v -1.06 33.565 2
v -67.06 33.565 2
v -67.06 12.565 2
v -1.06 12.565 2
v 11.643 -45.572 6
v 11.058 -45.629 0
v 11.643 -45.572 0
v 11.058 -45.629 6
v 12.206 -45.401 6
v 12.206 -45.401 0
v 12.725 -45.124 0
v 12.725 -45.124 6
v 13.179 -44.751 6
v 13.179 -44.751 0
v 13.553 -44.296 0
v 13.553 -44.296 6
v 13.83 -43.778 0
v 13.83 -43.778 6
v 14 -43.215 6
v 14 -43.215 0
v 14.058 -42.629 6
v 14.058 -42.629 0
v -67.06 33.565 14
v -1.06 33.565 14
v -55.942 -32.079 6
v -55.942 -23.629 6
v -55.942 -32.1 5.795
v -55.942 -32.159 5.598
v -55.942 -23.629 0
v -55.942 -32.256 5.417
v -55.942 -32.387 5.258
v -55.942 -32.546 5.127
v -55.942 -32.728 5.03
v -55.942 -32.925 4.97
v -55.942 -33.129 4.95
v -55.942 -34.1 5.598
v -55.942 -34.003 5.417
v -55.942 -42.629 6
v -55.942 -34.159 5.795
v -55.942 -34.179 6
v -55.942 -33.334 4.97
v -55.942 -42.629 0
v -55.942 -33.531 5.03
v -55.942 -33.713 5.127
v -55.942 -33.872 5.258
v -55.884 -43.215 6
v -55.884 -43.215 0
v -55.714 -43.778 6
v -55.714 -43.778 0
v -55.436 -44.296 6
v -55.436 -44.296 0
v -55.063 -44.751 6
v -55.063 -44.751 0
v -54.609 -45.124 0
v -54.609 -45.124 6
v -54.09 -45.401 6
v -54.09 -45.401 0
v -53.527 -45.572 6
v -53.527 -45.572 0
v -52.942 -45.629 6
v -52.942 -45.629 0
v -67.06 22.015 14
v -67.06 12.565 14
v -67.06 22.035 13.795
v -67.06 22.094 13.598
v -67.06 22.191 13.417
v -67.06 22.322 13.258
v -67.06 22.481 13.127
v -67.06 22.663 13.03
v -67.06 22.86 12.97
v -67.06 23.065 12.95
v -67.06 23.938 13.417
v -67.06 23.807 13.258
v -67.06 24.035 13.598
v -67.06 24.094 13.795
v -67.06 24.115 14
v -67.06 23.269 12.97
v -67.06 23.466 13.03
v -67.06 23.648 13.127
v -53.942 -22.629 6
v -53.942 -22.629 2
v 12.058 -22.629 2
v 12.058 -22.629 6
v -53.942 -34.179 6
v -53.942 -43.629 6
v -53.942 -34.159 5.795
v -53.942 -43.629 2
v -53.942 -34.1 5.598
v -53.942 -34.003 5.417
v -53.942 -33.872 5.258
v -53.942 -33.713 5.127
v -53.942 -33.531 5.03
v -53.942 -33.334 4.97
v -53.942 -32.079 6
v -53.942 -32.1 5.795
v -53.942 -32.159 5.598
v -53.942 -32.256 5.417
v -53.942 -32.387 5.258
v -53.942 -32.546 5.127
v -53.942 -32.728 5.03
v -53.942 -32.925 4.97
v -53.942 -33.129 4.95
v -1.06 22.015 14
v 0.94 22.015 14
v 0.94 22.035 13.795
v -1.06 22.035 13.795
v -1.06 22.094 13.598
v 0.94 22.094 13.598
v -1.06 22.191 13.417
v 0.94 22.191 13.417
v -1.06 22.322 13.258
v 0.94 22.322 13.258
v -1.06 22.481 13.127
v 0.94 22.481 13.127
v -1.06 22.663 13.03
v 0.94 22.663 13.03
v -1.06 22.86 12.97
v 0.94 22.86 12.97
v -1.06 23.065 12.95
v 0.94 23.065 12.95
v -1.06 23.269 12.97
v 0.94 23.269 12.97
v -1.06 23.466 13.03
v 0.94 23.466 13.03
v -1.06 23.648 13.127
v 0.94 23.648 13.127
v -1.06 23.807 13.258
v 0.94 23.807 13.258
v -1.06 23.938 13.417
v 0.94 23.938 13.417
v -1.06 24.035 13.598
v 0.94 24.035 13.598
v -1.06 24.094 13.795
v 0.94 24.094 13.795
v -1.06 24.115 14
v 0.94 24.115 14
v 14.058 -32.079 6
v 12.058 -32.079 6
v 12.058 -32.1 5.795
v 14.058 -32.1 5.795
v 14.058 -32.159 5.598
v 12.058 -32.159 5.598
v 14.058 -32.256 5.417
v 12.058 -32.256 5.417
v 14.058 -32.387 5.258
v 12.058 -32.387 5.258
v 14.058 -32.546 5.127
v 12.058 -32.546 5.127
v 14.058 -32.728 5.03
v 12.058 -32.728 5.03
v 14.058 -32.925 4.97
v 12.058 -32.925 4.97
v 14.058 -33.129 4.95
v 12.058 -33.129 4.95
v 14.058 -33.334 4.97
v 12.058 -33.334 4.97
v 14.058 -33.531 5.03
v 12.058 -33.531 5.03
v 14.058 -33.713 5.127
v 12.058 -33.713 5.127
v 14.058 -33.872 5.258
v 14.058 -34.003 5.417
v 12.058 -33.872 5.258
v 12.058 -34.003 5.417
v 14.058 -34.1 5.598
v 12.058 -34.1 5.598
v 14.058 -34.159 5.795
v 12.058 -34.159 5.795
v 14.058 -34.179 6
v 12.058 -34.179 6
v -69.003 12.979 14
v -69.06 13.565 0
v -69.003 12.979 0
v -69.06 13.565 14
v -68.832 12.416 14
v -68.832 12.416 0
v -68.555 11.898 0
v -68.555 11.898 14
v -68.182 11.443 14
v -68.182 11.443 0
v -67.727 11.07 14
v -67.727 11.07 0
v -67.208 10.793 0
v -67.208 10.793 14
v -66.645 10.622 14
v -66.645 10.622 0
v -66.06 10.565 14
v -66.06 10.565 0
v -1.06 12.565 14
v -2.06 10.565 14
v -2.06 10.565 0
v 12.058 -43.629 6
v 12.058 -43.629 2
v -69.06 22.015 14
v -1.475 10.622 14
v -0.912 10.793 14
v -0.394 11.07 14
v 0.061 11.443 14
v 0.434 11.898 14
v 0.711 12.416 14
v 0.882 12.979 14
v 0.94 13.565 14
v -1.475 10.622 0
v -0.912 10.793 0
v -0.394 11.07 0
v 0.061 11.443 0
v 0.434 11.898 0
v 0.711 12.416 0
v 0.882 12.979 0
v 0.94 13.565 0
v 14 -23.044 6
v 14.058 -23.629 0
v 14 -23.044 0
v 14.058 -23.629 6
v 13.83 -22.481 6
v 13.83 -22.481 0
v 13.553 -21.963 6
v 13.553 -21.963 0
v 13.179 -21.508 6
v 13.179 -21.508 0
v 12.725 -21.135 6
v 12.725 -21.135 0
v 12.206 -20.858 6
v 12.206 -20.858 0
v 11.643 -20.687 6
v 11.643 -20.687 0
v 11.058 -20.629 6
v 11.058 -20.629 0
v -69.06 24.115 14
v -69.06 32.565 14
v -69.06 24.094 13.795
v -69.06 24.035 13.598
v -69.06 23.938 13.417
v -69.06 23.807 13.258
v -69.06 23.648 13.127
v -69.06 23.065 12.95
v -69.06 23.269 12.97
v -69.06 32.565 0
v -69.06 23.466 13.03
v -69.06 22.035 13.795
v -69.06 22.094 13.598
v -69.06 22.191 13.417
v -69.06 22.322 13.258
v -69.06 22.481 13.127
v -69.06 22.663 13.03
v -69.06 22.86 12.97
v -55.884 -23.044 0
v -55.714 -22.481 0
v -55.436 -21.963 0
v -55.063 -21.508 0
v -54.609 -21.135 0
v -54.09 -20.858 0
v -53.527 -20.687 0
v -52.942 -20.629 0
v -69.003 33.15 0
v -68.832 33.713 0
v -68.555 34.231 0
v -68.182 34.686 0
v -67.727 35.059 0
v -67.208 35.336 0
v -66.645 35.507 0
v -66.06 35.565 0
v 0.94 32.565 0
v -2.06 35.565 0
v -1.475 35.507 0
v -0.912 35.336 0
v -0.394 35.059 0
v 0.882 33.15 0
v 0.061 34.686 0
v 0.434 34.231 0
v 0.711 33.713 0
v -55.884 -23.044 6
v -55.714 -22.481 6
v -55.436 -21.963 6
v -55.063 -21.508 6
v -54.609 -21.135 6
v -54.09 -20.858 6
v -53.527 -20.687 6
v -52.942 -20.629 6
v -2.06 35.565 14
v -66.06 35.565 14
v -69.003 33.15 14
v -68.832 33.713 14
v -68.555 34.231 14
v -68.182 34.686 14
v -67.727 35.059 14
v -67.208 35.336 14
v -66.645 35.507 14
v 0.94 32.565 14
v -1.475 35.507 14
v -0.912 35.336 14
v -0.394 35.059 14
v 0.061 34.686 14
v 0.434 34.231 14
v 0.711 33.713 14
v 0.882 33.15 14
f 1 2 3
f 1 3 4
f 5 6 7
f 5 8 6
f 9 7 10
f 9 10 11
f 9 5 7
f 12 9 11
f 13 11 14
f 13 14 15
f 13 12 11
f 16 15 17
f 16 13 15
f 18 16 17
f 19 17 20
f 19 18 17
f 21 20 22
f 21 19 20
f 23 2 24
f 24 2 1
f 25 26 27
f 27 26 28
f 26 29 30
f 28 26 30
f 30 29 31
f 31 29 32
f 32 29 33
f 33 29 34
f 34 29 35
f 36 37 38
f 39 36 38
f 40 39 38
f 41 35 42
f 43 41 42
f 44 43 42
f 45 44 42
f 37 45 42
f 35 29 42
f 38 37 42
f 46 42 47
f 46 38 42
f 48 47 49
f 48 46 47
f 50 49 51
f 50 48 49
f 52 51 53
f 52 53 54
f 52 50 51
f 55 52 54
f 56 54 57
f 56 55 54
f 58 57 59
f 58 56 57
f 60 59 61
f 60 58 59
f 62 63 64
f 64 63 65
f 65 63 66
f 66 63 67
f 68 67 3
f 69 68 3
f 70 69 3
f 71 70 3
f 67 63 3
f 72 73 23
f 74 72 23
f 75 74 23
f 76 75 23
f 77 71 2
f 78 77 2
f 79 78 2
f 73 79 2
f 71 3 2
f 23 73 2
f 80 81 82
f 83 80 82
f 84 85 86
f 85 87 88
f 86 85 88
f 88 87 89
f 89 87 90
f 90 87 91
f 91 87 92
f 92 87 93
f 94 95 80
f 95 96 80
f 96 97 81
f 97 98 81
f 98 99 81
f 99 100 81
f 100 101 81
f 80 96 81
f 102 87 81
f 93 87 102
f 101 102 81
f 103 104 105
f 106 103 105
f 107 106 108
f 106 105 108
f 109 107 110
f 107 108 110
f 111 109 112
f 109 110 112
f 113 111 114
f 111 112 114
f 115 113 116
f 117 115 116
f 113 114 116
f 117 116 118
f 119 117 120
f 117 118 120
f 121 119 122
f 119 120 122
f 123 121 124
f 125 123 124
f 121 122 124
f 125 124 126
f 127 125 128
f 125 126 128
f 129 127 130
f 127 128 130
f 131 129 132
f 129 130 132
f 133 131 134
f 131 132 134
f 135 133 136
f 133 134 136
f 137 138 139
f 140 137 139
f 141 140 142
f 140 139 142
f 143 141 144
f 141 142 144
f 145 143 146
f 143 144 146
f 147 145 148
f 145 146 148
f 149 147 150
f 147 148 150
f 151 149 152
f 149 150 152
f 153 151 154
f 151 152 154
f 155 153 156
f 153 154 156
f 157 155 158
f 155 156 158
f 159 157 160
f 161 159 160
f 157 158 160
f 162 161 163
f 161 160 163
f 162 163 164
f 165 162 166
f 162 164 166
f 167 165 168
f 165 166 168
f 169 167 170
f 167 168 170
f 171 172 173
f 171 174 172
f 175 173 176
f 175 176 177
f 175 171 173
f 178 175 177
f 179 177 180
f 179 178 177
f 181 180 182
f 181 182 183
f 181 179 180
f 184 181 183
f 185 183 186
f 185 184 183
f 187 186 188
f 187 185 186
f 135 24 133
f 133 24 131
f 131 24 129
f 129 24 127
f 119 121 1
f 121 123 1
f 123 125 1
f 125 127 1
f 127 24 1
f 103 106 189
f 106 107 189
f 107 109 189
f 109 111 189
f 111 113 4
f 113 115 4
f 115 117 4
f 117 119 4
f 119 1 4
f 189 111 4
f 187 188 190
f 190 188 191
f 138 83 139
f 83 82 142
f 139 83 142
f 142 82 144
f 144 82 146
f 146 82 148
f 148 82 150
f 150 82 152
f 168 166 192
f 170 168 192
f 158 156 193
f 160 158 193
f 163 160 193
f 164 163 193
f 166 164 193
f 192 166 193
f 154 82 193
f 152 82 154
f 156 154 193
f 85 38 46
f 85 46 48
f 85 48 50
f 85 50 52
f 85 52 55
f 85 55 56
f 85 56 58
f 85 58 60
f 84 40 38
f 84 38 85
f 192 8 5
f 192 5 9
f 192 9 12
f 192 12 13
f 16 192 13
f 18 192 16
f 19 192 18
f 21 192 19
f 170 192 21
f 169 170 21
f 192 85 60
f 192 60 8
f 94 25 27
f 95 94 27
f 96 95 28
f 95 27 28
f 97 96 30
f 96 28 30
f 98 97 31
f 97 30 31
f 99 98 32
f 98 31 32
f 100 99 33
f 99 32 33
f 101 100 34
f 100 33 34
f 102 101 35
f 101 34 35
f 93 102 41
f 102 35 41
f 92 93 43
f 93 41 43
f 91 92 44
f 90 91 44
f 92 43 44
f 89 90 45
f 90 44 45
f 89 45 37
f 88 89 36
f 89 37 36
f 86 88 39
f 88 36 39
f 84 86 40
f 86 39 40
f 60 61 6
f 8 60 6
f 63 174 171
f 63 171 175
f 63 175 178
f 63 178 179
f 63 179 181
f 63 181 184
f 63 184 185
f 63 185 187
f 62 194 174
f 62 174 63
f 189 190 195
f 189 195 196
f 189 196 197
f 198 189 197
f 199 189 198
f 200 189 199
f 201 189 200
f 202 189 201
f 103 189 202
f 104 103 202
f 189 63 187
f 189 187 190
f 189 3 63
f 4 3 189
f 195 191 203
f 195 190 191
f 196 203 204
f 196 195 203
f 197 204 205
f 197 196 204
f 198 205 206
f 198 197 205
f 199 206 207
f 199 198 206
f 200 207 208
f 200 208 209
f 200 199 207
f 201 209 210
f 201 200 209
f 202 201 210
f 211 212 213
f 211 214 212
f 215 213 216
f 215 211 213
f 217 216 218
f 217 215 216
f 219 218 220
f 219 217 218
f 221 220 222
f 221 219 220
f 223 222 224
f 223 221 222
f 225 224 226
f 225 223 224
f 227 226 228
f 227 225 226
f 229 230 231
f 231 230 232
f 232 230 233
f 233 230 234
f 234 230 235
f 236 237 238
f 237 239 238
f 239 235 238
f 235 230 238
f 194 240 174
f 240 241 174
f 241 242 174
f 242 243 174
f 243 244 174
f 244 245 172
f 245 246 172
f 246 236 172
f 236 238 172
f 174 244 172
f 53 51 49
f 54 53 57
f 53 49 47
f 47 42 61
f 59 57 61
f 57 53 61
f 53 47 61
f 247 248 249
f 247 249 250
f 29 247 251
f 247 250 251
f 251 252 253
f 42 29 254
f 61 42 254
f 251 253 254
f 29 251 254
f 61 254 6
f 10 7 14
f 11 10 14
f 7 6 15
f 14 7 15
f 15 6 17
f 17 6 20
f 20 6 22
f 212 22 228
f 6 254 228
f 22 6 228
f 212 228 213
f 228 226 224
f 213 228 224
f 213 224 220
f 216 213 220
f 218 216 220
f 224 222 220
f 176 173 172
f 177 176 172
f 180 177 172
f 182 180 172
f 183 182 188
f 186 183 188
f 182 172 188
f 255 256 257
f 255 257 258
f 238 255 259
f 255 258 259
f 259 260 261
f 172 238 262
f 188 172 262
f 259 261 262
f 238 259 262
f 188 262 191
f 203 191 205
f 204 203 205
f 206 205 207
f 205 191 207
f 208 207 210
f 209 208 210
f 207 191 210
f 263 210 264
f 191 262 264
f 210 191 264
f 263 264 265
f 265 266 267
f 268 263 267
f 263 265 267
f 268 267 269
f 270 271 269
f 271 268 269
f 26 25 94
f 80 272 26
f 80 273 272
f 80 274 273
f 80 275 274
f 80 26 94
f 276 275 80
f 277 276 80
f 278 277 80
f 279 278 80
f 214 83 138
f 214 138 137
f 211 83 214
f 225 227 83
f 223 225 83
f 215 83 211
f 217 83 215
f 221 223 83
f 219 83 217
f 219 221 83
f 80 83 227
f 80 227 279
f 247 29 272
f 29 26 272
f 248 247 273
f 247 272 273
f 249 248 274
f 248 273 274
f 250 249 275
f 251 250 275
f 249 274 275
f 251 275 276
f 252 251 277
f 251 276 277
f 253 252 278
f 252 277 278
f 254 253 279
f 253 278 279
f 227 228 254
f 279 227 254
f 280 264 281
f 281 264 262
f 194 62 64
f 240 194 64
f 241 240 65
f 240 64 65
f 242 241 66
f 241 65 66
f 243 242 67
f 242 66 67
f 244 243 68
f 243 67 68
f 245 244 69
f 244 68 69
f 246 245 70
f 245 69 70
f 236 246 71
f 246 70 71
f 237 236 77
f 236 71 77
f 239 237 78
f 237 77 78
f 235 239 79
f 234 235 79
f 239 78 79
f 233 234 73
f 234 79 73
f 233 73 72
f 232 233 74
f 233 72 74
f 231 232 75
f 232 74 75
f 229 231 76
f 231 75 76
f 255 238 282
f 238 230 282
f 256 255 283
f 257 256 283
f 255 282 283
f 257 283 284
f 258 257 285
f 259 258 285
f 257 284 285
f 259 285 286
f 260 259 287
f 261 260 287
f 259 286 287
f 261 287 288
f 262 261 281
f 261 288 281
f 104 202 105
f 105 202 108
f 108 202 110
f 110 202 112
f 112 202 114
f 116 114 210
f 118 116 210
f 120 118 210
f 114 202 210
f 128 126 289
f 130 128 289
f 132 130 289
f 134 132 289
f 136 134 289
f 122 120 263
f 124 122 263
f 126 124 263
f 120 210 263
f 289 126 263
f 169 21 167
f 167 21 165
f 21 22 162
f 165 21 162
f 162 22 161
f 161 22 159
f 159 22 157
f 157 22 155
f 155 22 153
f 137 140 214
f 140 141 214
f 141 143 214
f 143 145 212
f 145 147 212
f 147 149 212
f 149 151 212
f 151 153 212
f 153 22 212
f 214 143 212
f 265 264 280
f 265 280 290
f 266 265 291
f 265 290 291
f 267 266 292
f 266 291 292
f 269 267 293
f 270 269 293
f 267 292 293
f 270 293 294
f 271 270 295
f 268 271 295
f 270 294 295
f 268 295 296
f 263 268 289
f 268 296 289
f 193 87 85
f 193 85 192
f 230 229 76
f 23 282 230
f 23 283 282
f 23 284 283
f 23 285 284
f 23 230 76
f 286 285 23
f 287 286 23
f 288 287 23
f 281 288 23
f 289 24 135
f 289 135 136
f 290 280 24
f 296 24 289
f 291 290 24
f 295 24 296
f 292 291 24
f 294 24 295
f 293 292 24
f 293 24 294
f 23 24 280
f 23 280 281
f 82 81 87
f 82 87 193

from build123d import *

# Parameters (mm, degrees)
F0_W      = 66
F0_H      = 21
F1_DEPTH  = 2
F0_H_2    = 2
F2_DEPTH  = 14
F4_DEPTH  = 80
F5_R      = 3
F6_DEPTH  = 2
F7_DEPTH  = 6
F8_R      = 3
F10_DEPTH = 80


with BuildPart() as f1:
    # F0 (on Top) → F1 (new body)
    with BuildSketch(Plane.XY):
        with Locations((-34.0602138638, 23.0645144358)):
            Rectangle(F0_W, F0_H)
    extrude(amount=F1_DEPTH)

    # F0 (on Top) → F2 (join)
    with BuildSketch(Plane.XY):
        Polygon((-67.0602138638, 12.5645144358), (-67.0602138638, 33.5645144358), (-67.0602138638, 35.5645144358), (-69.0602138638, 35.5645144358), (-69.0602138638, 10.5645144358), (-67.0602138638, 10.5645144358), align=None)
        with Locations((-34.0602138638, 11.5645144358)):
            Rectangle(F0_W, F0_H_2)
        Polygon((-1.0602138638, 35.5645144358), (-1.0602138638, 33.5645144358), (-1.0602138638, 12.5645144358), (-1.0602138638, 10.5645144358), (0.9397861362, 10.5645144358), (0.9397861362, 35.5645144358), align=None)
        with Locations((-34.0602138638, 34.5645144358)):
            Rectangle(F0_W, F0_H_2)
    extrude(amount=F2_DEPTH)

    # F3 (on face) → F4 (cut)
    with BuildSketch(Plane.YZ.offset(0.9397861362)):
        with BuildLine():
            ThreePointArc((22.0145144358, 14), (23.0645144358, 12.95), (24.1145144358, 14))
            Line((24.1145144358, 14), (22.0145144358, 14))
        make_face()
    extrude(amount=-F4_DEPTH, mode=Mode.SUBTRACT)

    # F5
    f5_edges = [f1.edges().sort_by_distance(p)[0] for p in [
        (-69.060214, 35.564514, 7),
        (-69.060214, 10.564514, 7),
        (0.939786, 35.564514, 7),
        (0.939786, 10.564514, 7),
    ]]
    fillet(f5_edges, radius=F5_R)


with BuildPart() as f6:
    # F0 (on Top) → F6 (new body)
    with BuildSketch(Plane.XY):
        with Locations((-20.9418926388, -33.1294797361)):
            Rectangle(F0_W, F0_H)
    extrude(amount=F6_DEPTH)

    # F0 (on Top) → F7 (join)
    with BuildSketch(Plane.XY):
        with Locations((-20.9418926388, -21.6294797361)):
            Rectangle(F0_W, F0_H_2)
        Polygon((-53.9418926388, -43.6294797361), (-53.9418926388, -22.6294797361), (-53.9418926388, -20.6294797361), (-55.9418926388, -20.6294797361), (-55.9418926388, -45.6294797361), (-53.9418926388, -45.6294797361), align=None)
        with Locations((-20.9418926388, -44.6294797361)):
            Rectangle(F0_W, F0_H_2)
        Polygon((12.0581073612, -20.6294797361), (12.0581073612, -22.6294797361), (12.0581073612, -43.6294797361), (12.0581073612, -45.6294797361), (14.0581073612, -45.6294797361), (14.0581073612, -20.6294797361), align=None)
    extrude(amount=F7_DEPTH)

    # F8
    f8_edges = [f6.edges().sort_by_distance(p)[0] for p in [
        (-55.941893, -45.62948, 3),
        (-55.941893, -20.62948, 3),
        (14.058107, -20.62948, 3),
        (14.058107, -45.62948, 3),
    ]]
    fillet(f8_edges, radius=F8_R)

    # F9 (on face) → F10 (cut)
    with BuildSketch(Plane(origin=(-55.9418926388, 0, 0), x_dir=(0, -1, 0), z_dir=(-1, 0, 0))):
        with BuildLine():
            ThreePointArc((32.0794797361, 6), (33.1294797361, 4.95), (34.1794797361, 6))
            Line((34.1794797361, 6), (32.0794797361, 6))
        make_face()
    extrude(amount=-F10_DEPTH, mode=Mode.SUBTRACT)


solid = Compound([f1.part, f6.part])
